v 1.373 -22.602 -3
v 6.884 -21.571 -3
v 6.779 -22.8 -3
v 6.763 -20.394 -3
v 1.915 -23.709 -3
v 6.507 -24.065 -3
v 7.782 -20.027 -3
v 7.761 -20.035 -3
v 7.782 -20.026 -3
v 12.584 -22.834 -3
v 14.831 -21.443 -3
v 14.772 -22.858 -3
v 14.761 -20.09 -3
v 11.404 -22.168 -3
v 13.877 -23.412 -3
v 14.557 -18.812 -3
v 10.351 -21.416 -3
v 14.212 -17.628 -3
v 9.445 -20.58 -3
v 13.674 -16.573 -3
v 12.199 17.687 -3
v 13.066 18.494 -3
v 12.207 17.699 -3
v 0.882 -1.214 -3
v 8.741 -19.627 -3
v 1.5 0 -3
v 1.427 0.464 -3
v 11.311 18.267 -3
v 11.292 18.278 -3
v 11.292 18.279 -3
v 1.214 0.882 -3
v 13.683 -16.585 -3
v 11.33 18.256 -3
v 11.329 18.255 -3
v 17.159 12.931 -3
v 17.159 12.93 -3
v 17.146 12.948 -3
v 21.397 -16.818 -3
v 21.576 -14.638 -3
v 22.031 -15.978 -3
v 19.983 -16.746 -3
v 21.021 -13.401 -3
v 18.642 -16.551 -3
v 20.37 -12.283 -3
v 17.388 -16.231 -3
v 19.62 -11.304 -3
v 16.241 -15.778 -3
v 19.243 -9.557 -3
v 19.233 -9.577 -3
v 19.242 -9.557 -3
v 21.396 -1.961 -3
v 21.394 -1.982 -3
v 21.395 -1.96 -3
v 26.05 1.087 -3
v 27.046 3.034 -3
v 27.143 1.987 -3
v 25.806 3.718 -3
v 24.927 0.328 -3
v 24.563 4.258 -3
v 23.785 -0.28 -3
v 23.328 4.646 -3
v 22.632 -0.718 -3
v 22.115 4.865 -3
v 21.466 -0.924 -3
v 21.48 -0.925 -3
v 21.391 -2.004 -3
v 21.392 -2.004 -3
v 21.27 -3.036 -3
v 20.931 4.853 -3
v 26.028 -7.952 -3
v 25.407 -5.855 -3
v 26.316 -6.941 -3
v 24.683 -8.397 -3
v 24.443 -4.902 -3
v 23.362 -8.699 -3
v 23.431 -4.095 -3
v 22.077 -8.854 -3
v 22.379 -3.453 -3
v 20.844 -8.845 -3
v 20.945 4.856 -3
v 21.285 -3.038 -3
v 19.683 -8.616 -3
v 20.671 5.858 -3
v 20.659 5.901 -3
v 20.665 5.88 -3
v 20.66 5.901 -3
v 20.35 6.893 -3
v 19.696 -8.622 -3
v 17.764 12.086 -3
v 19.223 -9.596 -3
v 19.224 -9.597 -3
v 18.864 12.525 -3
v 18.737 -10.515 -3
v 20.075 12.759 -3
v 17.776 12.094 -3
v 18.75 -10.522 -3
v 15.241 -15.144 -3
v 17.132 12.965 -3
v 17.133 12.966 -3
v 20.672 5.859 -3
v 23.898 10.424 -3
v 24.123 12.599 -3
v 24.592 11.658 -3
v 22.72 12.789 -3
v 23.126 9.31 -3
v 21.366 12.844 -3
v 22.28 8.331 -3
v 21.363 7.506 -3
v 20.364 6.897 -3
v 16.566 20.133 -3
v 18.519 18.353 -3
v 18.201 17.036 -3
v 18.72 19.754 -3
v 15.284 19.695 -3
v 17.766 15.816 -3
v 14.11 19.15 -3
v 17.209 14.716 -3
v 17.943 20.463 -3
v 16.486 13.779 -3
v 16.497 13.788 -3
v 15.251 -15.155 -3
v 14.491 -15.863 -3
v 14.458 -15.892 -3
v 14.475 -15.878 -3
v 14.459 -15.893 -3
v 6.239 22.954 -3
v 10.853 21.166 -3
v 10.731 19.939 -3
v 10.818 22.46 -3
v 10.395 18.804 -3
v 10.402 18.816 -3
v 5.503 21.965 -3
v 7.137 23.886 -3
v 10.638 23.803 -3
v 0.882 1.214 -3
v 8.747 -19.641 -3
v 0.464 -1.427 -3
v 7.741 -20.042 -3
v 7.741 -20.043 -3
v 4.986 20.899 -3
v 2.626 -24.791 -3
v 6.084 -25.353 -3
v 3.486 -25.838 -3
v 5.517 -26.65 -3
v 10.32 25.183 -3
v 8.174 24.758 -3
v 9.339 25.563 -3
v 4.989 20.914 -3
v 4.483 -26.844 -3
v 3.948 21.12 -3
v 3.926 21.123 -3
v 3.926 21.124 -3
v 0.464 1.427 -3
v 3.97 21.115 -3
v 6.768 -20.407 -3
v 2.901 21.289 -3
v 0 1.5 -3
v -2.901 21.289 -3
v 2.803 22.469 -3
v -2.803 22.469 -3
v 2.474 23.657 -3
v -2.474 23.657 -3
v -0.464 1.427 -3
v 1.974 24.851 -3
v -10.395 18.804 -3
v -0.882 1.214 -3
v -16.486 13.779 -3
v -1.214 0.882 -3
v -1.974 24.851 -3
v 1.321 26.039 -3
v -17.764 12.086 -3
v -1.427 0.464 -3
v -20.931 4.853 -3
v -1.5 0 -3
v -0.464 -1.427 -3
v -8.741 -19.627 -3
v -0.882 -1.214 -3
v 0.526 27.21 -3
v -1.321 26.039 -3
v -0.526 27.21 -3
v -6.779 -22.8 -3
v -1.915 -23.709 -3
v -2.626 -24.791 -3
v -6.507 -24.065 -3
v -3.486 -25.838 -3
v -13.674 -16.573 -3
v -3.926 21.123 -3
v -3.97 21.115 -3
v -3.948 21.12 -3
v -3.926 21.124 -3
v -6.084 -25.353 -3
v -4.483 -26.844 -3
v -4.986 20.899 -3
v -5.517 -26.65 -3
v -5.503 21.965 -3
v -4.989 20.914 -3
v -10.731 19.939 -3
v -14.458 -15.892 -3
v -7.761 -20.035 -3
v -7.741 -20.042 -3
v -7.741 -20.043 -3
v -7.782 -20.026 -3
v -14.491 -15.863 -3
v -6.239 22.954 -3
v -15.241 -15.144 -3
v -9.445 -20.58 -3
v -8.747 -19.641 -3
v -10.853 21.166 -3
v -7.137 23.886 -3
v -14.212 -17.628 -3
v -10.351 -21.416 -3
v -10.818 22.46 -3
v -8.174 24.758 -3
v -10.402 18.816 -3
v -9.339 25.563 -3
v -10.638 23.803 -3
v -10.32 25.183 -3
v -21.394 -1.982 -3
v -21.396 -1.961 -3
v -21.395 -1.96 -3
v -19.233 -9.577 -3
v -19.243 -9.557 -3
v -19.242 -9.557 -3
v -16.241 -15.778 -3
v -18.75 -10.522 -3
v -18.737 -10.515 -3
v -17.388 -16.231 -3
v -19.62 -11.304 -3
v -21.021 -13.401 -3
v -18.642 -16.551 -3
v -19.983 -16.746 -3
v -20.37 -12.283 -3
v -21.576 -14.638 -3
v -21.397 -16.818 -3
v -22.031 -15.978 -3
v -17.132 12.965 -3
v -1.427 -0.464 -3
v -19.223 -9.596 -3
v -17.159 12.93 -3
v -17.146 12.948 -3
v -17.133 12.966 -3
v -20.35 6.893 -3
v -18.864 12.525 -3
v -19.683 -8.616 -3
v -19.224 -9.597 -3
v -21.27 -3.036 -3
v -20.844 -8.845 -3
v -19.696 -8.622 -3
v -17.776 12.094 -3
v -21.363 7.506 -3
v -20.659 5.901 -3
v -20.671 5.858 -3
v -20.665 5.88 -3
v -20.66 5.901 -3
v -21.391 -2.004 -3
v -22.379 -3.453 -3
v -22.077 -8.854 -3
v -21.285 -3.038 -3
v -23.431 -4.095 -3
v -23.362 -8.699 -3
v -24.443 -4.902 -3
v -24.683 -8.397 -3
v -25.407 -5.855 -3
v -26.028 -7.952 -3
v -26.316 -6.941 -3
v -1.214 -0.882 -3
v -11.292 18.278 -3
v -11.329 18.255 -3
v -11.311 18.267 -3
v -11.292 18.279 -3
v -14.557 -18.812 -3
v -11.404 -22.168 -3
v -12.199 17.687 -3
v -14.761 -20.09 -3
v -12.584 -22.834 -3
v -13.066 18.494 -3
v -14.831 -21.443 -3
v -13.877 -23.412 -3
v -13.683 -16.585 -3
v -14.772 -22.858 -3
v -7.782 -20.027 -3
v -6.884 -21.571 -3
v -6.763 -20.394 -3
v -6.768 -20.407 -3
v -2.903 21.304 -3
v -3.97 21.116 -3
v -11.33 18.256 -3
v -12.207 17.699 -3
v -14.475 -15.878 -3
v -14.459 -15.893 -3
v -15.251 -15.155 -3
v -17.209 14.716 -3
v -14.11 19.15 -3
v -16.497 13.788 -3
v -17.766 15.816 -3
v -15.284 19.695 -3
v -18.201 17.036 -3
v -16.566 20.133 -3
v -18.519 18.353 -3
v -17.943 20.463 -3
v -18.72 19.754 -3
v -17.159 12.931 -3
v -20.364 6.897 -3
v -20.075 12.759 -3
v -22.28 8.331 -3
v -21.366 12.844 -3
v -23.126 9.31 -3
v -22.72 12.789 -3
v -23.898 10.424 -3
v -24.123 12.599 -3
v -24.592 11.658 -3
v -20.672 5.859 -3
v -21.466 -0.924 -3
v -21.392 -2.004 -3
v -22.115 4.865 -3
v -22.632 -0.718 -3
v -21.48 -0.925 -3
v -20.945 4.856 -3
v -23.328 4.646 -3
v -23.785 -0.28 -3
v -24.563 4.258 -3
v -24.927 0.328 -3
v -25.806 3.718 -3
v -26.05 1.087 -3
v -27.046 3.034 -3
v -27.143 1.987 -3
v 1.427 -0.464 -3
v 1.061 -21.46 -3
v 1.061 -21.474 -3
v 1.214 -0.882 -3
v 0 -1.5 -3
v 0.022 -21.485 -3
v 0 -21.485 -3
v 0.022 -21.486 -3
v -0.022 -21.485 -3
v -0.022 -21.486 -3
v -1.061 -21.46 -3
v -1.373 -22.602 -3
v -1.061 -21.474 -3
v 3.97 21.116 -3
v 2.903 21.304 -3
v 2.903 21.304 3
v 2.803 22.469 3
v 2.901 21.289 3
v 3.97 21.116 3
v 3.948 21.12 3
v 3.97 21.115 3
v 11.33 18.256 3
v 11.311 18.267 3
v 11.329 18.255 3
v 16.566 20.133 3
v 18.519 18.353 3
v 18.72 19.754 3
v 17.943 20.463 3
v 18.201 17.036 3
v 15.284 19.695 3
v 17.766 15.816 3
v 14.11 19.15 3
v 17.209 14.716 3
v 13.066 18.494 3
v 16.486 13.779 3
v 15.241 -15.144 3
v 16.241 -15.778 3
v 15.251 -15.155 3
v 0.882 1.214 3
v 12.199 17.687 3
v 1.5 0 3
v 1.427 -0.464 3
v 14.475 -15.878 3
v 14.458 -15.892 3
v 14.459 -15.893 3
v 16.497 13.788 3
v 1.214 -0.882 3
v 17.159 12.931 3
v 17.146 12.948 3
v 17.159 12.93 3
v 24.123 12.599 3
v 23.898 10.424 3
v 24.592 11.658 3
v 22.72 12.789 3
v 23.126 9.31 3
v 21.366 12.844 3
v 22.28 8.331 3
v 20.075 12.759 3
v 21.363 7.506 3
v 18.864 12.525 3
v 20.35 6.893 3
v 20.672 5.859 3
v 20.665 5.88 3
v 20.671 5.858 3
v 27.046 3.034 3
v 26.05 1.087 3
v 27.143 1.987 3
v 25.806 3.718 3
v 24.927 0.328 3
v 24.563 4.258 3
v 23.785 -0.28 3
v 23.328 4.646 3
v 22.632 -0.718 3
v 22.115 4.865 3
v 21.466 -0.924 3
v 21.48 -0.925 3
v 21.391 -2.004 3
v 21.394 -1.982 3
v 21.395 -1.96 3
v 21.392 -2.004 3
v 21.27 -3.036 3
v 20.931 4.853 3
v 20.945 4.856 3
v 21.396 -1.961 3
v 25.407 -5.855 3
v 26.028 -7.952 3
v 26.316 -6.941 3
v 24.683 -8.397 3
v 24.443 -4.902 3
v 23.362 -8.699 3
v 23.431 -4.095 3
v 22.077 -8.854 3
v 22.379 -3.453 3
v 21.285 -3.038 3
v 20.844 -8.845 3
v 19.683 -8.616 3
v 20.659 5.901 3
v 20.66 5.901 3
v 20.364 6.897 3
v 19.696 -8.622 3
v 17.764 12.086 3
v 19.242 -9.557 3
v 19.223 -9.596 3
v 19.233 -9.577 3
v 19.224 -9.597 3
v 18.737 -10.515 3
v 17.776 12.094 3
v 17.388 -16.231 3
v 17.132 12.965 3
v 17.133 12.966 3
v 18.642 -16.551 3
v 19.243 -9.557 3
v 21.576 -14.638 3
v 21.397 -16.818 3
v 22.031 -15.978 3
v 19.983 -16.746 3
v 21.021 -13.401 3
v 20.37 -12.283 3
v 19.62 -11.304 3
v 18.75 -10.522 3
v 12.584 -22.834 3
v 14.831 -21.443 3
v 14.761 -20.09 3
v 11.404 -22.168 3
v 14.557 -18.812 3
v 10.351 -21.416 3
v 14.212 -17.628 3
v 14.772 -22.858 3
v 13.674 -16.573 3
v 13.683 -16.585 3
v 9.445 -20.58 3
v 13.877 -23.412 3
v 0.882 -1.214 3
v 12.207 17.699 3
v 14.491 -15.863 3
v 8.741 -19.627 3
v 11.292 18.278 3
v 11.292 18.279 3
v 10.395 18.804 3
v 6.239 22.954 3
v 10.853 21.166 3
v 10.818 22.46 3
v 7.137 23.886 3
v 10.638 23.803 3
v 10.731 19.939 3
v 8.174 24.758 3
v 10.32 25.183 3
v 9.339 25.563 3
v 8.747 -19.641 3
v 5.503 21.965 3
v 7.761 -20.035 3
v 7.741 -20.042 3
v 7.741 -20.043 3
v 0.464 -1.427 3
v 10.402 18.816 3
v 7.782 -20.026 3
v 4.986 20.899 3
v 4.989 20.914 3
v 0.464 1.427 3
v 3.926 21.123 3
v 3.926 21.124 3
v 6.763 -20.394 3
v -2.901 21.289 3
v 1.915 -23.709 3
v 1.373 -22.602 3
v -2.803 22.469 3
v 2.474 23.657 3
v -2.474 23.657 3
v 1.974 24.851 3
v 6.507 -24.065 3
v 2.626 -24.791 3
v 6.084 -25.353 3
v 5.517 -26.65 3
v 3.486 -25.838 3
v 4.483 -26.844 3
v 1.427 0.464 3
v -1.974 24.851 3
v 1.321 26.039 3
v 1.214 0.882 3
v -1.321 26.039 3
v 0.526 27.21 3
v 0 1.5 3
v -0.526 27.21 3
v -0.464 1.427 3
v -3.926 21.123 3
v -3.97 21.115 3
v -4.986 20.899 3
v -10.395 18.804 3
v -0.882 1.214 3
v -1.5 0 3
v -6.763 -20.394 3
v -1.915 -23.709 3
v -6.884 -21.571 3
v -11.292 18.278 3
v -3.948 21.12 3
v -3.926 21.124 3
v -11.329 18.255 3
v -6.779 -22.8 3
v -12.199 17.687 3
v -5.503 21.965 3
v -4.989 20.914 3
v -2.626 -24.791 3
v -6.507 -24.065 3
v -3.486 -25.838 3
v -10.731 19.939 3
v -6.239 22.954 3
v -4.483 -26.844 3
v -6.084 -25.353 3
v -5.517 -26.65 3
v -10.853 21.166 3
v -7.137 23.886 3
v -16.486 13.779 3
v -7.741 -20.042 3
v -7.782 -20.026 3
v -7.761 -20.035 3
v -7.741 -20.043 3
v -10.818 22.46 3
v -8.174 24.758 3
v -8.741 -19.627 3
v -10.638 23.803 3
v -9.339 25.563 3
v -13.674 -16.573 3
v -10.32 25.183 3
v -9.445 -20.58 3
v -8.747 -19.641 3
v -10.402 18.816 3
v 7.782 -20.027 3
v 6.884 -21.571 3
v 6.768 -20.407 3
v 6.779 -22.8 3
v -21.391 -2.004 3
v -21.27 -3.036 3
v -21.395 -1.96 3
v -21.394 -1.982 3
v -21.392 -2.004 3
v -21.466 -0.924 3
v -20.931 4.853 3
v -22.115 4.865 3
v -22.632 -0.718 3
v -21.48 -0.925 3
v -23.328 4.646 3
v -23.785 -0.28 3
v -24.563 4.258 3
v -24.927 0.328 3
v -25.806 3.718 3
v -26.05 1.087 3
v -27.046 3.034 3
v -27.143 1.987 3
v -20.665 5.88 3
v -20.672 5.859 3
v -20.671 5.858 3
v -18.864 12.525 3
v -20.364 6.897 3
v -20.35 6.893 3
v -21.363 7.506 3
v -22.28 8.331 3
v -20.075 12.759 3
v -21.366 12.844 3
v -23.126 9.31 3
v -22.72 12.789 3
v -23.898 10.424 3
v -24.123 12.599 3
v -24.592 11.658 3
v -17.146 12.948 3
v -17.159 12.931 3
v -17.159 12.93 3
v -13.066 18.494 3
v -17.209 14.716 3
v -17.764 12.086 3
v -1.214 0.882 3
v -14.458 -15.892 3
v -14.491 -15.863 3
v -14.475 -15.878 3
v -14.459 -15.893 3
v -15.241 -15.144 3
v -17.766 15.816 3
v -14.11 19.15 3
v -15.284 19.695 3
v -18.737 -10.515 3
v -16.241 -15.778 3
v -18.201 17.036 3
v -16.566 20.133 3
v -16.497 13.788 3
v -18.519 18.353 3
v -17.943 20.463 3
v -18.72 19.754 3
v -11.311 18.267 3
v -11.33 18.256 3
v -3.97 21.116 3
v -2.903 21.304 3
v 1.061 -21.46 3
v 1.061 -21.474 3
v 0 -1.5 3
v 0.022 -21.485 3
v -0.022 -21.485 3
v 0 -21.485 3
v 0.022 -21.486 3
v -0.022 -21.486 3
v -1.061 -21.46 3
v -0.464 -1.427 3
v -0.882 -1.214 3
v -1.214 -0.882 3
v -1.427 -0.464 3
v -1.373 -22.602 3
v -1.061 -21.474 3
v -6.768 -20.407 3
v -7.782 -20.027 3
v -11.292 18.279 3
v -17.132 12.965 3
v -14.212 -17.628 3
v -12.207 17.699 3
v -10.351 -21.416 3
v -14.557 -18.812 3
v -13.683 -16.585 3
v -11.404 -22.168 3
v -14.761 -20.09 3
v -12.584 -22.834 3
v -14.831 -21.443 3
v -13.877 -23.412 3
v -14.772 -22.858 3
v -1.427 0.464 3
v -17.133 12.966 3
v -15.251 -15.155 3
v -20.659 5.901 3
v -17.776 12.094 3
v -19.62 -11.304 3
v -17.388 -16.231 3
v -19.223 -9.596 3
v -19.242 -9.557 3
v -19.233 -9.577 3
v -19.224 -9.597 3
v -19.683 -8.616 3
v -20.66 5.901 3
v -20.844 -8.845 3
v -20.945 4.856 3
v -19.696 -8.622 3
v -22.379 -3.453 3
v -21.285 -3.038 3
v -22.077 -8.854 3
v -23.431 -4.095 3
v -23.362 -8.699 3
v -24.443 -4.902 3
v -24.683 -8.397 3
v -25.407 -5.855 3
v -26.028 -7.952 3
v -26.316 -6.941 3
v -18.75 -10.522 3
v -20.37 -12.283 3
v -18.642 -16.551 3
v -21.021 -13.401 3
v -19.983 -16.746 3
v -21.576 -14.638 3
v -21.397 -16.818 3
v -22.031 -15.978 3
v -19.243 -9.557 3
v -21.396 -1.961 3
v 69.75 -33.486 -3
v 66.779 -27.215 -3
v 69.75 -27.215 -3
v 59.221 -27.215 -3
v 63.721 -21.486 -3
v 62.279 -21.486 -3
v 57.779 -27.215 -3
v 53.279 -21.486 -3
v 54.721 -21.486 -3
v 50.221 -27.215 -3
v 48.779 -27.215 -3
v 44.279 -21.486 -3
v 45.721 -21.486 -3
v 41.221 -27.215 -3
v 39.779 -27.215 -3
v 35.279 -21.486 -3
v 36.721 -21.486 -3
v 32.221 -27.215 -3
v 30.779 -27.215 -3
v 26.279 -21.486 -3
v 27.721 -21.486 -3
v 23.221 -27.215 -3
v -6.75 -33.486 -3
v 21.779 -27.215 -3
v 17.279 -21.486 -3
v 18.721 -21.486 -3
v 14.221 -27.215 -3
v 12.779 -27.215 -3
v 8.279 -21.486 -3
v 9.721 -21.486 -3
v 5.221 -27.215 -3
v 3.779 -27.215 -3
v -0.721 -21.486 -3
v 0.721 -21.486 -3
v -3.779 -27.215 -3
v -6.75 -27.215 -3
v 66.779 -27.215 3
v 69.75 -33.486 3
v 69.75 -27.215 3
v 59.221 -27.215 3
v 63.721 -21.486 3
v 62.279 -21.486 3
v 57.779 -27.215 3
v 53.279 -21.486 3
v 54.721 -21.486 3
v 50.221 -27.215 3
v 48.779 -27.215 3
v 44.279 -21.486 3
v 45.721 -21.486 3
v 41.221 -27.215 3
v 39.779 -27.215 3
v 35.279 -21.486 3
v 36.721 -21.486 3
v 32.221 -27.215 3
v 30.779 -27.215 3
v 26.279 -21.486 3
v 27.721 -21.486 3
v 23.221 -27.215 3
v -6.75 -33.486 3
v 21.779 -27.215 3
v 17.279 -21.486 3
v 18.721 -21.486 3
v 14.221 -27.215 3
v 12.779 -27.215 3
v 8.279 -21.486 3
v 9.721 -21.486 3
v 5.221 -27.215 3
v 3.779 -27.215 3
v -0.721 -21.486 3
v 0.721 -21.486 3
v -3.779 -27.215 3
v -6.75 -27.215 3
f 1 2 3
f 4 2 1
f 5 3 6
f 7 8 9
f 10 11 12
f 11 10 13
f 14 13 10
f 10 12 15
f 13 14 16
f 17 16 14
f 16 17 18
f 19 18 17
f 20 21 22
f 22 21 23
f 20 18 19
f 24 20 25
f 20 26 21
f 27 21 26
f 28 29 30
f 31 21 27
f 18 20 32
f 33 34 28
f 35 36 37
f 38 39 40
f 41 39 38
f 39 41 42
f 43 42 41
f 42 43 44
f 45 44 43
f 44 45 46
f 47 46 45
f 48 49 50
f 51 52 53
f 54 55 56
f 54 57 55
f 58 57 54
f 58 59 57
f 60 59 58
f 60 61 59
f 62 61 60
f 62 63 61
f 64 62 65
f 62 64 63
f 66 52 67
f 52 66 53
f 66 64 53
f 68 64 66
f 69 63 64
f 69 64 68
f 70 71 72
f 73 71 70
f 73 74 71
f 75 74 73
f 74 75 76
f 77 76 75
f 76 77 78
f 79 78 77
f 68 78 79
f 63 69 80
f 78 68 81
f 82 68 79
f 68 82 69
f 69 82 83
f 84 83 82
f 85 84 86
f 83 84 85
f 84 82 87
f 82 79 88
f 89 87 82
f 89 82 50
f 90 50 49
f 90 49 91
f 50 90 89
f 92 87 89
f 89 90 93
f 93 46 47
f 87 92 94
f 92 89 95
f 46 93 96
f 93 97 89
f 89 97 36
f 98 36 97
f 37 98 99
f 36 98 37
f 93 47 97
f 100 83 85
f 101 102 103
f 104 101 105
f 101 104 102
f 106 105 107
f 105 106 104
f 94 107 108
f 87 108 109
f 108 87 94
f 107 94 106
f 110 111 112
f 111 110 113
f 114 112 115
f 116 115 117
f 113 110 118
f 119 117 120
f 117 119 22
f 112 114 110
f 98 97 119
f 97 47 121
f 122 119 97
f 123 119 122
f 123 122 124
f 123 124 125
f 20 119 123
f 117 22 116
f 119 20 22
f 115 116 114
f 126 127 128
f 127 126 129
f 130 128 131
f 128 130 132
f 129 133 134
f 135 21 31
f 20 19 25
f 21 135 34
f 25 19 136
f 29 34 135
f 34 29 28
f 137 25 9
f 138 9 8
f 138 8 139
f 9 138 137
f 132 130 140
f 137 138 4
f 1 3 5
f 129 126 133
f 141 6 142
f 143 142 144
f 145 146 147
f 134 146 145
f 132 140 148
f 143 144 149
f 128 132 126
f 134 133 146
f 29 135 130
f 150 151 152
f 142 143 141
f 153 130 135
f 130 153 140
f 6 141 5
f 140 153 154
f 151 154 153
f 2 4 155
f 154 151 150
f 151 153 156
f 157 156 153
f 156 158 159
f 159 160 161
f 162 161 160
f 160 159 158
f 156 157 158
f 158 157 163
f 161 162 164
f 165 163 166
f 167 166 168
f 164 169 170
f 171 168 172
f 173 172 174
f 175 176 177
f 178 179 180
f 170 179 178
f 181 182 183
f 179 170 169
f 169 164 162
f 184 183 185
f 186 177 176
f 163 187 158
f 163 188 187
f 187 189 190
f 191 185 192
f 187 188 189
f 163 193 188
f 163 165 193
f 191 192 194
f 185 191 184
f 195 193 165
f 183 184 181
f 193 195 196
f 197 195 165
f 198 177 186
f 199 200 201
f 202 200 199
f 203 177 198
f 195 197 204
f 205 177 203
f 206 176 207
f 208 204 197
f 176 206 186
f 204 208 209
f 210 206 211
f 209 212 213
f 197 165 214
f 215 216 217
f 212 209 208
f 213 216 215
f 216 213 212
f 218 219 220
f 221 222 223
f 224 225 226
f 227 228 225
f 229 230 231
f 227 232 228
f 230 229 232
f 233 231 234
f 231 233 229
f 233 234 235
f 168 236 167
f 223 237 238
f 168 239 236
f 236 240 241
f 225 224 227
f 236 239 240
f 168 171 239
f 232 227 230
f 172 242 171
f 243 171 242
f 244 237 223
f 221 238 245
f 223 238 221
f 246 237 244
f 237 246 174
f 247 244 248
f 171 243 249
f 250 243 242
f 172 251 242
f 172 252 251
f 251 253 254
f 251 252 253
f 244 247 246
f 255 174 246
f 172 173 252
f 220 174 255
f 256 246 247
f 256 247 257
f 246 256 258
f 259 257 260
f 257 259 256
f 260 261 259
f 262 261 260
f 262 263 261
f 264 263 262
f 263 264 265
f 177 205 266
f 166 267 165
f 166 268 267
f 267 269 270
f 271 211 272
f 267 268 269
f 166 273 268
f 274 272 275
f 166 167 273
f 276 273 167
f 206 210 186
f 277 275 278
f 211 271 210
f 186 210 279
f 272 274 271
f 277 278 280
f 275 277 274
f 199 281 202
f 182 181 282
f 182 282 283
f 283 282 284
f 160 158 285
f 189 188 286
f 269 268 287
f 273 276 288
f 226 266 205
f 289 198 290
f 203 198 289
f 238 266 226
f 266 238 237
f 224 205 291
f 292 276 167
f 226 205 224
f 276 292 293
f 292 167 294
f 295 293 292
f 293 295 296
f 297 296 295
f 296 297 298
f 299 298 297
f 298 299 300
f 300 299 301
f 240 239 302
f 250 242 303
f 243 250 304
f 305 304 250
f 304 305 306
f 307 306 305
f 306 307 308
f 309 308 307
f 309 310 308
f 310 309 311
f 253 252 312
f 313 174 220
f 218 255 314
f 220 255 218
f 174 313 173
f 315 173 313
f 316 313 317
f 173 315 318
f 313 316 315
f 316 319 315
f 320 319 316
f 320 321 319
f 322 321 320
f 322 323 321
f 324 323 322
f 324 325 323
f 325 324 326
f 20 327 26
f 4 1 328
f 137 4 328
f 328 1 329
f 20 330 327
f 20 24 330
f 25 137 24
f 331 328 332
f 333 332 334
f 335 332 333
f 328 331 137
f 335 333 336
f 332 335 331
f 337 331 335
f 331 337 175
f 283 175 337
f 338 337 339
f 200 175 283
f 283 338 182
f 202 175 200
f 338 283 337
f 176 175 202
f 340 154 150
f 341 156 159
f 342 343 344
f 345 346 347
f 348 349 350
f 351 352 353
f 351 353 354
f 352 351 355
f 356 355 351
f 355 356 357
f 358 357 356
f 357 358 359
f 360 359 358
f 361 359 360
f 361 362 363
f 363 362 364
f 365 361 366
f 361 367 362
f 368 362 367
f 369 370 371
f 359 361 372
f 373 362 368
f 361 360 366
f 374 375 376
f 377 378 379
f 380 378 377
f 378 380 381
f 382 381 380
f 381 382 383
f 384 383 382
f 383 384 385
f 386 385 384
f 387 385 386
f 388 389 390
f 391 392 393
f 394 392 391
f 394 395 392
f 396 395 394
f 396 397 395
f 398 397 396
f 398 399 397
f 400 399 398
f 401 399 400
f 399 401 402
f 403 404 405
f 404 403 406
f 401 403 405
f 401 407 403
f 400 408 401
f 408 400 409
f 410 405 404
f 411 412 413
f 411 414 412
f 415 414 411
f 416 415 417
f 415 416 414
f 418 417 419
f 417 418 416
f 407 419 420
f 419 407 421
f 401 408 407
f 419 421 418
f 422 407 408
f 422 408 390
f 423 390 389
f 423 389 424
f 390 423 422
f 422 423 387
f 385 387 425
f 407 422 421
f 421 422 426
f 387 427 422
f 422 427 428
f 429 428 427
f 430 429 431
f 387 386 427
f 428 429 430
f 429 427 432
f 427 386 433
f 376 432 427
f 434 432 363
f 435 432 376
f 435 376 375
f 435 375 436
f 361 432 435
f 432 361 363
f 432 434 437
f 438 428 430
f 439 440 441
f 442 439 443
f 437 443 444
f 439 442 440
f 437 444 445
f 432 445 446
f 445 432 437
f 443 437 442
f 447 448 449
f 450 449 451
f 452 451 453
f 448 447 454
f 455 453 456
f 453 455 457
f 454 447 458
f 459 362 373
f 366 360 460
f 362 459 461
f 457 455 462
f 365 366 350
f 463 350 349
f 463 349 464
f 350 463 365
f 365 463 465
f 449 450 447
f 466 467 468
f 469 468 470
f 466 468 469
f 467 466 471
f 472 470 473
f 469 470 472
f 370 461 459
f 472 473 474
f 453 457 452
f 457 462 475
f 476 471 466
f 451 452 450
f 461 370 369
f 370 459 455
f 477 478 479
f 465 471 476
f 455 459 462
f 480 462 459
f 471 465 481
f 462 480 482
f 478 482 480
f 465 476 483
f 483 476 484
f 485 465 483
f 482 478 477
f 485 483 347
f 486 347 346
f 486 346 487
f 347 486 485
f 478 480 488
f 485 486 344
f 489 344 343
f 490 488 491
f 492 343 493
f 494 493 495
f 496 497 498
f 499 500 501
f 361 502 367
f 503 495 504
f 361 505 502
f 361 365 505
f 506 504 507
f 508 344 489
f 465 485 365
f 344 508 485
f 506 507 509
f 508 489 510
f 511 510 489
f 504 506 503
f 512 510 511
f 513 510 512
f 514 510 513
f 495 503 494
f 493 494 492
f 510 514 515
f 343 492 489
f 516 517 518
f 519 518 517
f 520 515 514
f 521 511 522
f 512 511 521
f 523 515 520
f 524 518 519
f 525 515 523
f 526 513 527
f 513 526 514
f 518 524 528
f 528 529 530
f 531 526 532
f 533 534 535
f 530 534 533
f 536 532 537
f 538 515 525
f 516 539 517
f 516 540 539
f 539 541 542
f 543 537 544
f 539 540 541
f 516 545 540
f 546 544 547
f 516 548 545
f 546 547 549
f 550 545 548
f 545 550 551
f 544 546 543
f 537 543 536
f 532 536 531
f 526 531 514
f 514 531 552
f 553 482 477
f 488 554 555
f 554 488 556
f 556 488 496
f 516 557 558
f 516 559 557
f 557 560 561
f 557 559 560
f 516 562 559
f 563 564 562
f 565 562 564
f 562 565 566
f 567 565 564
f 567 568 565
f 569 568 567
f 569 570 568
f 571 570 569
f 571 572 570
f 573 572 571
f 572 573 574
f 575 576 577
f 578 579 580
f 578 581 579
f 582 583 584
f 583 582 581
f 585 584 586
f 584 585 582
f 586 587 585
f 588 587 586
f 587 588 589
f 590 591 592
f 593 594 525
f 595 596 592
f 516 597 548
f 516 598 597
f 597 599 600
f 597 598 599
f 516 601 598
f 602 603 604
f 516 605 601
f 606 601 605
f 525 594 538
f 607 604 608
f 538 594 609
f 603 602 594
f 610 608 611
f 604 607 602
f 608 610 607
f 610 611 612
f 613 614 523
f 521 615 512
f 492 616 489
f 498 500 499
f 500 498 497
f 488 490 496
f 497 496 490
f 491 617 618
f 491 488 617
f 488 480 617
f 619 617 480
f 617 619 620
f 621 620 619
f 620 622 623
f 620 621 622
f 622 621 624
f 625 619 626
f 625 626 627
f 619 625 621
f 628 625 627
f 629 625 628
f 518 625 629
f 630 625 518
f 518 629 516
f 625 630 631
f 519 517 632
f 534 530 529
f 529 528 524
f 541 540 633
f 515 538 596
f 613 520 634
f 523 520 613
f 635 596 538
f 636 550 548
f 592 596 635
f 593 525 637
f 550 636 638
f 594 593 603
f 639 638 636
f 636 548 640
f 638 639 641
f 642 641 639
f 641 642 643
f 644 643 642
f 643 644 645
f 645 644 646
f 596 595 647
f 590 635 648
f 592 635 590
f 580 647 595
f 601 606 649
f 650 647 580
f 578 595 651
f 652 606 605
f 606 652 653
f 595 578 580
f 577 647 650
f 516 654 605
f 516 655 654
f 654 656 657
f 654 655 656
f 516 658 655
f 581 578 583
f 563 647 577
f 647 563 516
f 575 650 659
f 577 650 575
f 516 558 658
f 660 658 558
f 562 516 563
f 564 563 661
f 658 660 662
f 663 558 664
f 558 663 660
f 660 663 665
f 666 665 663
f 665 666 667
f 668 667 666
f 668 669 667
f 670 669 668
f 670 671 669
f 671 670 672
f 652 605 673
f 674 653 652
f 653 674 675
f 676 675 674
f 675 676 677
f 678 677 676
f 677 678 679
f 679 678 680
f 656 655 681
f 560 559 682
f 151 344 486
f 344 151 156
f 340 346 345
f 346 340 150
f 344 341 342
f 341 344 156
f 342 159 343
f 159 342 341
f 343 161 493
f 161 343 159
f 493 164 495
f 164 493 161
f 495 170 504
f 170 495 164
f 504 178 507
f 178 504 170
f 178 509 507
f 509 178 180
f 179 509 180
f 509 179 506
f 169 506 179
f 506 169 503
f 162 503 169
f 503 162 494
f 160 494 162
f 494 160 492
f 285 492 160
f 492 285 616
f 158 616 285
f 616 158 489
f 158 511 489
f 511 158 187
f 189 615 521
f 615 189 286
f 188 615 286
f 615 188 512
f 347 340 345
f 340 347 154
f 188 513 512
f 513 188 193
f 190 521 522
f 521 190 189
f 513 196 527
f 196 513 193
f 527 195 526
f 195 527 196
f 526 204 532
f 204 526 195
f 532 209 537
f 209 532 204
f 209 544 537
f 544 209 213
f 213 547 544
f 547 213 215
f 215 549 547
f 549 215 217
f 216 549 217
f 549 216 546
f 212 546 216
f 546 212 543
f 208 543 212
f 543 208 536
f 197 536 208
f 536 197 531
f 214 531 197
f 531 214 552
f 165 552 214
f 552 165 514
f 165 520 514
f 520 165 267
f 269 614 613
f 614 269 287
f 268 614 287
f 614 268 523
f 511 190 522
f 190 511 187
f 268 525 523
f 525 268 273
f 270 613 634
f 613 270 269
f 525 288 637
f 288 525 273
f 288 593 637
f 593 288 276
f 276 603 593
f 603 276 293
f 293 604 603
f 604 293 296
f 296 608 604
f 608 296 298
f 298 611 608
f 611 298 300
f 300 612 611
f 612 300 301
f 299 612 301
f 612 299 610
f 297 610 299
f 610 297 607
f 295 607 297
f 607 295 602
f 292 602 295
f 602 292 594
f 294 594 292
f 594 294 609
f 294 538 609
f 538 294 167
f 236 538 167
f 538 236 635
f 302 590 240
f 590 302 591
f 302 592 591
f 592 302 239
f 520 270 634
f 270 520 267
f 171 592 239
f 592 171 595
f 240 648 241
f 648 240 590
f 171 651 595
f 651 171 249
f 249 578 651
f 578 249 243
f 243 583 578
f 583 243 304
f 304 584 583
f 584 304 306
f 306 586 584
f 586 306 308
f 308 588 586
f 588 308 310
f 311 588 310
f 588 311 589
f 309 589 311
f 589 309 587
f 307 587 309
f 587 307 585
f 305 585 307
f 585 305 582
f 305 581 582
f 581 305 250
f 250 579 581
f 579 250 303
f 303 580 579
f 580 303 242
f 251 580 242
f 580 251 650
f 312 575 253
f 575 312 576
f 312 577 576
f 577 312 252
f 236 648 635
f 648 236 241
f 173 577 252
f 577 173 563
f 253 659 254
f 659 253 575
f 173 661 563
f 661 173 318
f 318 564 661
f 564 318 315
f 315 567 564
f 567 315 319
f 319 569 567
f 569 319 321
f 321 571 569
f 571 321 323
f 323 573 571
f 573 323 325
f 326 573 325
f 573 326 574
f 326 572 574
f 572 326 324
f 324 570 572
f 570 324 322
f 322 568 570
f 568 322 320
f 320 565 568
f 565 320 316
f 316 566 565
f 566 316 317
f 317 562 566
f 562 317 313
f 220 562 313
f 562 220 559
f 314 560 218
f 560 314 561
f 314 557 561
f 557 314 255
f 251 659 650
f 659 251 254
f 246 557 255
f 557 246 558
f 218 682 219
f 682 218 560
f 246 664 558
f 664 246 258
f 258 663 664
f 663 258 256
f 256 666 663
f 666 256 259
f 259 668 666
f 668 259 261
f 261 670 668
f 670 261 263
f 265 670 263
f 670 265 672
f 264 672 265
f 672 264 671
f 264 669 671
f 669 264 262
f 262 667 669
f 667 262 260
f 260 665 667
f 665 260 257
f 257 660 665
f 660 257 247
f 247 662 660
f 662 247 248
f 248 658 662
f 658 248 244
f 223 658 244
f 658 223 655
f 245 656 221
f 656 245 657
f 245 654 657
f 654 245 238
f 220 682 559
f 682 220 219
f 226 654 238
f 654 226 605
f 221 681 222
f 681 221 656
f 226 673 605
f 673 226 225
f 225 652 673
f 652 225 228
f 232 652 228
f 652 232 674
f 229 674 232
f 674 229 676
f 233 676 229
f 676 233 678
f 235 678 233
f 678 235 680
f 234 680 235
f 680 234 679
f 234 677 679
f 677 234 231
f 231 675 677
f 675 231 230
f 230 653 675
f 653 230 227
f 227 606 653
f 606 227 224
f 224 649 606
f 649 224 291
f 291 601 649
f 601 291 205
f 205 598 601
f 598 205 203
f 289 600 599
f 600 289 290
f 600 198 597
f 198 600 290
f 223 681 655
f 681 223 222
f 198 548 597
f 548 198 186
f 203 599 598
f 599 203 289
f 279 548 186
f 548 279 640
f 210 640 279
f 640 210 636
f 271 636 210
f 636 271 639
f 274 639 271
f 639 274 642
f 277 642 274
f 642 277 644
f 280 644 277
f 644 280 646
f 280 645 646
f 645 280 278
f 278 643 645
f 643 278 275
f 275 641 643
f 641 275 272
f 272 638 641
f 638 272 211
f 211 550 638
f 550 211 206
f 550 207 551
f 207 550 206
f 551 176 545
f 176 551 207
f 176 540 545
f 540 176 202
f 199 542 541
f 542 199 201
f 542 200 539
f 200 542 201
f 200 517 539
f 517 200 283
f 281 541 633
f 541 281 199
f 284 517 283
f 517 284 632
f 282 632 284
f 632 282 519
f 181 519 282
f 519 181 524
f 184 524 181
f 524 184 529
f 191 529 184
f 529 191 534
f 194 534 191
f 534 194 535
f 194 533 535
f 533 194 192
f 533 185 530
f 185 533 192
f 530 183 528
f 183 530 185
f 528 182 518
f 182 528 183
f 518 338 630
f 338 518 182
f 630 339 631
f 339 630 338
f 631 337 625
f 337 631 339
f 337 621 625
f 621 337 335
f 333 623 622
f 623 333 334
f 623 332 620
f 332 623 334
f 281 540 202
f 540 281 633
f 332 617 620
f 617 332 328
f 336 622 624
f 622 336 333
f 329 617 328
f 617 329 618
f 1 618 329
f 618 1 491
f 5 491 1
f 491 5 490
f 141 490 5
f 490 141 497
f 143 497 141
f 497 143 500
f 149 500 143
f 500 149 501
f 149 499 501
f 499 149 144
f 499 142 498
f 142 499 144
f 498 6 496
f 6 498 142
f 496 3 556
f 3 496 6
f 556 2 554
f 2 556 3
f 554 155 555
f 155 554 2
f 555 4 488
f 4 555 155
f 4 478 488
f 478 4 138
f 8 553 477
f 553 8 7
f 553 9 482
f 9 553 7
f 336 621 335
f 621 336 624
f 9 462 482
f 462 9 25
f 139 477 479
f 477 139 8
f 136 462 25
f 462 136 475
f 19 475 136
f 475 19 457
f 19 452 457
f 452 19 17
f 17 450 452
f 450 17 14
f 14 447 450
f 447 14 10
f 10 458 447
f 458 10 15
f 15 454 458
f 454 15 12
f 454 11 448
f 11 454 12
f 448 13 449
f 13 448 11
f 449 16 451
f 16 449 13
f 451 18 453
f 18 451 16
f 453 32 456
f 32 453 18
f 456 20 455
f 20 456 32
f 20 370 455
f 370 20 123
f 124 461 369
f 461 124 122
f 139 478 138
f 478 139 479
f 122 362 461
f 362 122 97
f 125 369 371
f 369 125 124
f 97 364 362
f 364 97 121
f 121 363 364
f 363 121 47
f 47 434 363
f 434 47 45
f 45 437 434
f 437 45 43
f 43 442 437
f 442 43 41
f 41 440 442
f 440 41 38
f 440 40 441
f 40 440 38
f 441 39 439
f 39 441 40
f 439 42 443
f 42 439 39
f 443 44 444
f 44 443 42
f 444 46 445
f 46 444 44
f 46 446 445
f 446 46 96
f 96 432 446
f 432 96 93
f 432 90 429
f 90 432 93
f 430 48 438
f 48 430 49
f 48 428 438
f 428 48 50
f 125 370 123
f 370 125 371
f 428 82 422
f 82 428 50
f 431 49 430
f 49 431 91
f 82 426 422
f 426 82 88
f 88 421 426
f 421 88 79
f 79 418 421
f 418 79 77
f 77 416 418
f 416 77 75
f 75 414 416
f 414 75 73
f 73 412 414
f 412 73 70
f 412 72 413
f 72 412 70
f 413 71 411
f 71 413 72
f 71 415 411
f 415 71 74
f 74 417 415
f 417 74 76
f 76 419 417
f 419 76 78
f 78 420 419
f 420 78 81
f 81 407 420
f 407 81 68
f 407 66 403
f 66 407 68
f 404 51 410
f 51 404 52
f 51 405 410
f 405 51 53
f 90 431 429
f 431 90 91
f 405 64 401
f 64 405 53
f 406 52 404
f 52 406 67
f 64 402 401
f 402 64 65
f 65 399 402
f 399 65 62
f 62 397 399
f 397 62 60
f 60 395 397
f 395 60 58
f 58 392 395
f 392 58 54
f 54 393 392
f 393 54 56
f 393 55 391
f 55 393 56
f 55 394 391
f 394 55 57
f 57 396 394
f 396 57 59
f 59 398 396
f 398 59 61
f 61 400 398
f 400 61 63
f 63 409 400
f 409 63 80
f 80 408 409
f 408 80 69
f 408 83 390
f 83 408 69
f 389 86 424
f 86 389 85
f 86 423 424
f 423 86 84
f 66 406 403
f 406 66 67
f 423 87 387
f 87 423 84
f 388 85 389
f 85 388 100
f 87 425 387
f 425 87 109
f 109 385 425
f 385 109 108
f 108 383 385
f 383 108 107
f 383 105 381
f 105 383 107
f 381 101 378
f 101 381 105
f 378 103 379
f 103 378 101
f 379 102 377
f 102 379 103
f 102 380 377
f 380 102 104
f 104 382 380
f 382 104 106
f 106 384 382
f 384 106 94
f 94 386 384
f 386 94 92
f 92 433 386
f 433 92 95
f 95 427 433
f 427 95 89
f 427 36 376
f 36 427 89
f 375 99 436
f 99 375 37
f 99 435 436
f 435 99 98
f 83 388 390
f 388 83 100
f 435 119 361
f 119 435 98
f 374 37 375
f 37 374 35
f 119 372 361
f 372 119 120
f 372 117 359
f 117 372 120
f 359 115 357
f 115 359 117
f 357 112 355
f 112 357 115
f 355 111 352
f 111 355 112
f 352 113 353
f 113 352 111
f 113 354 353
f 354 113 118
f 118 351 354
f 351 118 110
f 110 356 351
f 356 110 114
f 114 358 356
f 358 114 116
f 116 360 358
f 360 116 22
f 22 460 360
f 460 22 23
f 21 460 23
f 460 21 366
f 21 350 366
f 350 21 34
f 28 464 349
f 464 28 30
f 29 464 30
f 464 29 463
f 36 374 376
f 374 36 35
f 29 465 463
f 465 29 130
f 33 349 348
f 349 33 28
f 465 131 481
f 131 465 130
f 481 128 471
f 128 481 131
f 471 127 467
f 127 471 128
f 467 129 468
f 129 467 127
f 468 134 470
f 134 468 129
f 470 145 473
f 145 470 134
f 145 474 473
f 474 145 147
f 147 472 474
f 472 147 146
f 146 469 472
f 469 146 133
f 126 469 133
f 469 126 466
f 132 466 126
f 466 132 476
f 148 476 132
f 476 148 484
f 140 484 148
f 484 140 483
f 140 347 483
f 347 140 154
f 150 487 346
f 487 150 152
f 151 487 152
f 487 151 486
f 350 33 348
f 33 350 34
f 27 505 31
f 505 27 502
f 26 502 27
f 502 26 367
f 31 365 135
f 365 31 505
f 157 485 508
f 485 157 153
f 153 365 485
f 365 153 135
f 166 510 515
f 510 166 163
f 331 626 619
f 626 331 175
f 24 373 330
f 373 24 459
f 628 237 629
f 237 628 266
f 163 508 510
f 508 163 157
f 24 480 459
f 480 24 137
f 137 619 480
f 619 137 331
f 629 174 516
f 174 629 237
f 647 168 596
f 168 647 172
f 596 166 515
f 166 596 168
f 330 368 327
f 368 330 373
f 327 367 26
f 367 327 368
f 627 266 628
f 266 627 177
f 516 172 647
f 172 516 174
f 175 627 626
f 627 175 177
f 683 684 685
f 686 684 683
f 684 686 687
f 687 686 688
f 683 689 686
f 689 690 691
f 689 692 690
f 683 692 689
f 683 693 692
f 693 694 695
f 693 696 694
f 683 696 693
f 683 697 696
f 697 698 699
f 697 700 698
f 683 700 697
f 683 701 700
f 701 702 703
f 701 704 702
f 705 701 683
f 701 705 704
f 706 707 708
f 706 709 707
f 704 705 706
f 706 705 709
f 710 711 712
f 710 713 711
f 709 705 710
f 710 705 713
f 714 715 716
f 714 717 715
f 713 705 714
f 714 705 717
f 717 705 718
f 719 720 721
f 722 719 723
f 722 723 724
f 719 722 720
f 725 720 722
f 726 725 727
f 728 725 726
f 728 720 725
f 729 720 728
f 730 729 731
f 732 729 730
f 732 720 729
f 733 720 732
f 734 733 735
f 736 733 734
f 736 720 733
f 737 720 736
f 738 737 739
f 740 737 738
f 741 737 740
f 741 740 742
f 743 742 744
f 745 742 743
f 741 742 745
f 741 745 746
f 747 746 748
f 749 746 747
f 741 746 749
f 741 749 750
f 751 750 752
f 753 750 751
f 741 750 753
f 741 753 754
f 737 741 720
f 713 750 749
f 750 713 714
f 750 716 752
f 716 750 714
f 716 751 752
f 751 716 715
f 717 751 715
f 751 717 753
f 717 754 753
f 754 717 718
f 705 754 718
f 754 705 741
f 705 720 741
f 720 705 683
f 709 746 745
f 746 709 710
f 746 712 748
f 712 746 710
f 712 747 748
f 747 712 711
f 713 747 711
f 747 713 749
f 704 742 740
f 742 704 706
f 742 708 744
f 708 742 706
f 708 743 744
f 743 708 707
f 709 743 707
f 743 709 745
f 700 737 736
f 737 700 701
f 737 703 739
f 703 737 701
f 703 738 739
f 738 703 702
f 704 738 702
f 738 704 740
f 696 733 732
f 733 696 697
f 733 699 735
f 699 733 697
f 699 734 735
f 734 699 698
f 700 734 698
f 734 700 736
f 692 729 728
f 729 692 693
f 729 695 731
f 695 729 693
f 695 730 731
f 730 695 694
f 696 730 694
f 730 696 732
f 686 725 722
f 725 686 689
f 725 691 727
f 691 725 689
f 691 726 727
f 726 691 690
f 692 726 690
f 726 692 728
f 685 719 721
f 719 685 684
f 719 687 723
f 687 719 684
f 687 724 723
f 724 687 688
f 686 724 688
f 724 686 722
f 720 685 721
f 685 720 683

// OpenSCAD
use <libraries/publicDomainGearV1.1.scad>;

mm_per_tooth = 9;
n1 = 17;
n2 = 8;

gear(mm_per_tooth, number_of_teeth=n1);
translate([0, -pitch_radius(mm_per_tooth, n1), 0])
	rack(mm_per_tooth, n2, height=12);
